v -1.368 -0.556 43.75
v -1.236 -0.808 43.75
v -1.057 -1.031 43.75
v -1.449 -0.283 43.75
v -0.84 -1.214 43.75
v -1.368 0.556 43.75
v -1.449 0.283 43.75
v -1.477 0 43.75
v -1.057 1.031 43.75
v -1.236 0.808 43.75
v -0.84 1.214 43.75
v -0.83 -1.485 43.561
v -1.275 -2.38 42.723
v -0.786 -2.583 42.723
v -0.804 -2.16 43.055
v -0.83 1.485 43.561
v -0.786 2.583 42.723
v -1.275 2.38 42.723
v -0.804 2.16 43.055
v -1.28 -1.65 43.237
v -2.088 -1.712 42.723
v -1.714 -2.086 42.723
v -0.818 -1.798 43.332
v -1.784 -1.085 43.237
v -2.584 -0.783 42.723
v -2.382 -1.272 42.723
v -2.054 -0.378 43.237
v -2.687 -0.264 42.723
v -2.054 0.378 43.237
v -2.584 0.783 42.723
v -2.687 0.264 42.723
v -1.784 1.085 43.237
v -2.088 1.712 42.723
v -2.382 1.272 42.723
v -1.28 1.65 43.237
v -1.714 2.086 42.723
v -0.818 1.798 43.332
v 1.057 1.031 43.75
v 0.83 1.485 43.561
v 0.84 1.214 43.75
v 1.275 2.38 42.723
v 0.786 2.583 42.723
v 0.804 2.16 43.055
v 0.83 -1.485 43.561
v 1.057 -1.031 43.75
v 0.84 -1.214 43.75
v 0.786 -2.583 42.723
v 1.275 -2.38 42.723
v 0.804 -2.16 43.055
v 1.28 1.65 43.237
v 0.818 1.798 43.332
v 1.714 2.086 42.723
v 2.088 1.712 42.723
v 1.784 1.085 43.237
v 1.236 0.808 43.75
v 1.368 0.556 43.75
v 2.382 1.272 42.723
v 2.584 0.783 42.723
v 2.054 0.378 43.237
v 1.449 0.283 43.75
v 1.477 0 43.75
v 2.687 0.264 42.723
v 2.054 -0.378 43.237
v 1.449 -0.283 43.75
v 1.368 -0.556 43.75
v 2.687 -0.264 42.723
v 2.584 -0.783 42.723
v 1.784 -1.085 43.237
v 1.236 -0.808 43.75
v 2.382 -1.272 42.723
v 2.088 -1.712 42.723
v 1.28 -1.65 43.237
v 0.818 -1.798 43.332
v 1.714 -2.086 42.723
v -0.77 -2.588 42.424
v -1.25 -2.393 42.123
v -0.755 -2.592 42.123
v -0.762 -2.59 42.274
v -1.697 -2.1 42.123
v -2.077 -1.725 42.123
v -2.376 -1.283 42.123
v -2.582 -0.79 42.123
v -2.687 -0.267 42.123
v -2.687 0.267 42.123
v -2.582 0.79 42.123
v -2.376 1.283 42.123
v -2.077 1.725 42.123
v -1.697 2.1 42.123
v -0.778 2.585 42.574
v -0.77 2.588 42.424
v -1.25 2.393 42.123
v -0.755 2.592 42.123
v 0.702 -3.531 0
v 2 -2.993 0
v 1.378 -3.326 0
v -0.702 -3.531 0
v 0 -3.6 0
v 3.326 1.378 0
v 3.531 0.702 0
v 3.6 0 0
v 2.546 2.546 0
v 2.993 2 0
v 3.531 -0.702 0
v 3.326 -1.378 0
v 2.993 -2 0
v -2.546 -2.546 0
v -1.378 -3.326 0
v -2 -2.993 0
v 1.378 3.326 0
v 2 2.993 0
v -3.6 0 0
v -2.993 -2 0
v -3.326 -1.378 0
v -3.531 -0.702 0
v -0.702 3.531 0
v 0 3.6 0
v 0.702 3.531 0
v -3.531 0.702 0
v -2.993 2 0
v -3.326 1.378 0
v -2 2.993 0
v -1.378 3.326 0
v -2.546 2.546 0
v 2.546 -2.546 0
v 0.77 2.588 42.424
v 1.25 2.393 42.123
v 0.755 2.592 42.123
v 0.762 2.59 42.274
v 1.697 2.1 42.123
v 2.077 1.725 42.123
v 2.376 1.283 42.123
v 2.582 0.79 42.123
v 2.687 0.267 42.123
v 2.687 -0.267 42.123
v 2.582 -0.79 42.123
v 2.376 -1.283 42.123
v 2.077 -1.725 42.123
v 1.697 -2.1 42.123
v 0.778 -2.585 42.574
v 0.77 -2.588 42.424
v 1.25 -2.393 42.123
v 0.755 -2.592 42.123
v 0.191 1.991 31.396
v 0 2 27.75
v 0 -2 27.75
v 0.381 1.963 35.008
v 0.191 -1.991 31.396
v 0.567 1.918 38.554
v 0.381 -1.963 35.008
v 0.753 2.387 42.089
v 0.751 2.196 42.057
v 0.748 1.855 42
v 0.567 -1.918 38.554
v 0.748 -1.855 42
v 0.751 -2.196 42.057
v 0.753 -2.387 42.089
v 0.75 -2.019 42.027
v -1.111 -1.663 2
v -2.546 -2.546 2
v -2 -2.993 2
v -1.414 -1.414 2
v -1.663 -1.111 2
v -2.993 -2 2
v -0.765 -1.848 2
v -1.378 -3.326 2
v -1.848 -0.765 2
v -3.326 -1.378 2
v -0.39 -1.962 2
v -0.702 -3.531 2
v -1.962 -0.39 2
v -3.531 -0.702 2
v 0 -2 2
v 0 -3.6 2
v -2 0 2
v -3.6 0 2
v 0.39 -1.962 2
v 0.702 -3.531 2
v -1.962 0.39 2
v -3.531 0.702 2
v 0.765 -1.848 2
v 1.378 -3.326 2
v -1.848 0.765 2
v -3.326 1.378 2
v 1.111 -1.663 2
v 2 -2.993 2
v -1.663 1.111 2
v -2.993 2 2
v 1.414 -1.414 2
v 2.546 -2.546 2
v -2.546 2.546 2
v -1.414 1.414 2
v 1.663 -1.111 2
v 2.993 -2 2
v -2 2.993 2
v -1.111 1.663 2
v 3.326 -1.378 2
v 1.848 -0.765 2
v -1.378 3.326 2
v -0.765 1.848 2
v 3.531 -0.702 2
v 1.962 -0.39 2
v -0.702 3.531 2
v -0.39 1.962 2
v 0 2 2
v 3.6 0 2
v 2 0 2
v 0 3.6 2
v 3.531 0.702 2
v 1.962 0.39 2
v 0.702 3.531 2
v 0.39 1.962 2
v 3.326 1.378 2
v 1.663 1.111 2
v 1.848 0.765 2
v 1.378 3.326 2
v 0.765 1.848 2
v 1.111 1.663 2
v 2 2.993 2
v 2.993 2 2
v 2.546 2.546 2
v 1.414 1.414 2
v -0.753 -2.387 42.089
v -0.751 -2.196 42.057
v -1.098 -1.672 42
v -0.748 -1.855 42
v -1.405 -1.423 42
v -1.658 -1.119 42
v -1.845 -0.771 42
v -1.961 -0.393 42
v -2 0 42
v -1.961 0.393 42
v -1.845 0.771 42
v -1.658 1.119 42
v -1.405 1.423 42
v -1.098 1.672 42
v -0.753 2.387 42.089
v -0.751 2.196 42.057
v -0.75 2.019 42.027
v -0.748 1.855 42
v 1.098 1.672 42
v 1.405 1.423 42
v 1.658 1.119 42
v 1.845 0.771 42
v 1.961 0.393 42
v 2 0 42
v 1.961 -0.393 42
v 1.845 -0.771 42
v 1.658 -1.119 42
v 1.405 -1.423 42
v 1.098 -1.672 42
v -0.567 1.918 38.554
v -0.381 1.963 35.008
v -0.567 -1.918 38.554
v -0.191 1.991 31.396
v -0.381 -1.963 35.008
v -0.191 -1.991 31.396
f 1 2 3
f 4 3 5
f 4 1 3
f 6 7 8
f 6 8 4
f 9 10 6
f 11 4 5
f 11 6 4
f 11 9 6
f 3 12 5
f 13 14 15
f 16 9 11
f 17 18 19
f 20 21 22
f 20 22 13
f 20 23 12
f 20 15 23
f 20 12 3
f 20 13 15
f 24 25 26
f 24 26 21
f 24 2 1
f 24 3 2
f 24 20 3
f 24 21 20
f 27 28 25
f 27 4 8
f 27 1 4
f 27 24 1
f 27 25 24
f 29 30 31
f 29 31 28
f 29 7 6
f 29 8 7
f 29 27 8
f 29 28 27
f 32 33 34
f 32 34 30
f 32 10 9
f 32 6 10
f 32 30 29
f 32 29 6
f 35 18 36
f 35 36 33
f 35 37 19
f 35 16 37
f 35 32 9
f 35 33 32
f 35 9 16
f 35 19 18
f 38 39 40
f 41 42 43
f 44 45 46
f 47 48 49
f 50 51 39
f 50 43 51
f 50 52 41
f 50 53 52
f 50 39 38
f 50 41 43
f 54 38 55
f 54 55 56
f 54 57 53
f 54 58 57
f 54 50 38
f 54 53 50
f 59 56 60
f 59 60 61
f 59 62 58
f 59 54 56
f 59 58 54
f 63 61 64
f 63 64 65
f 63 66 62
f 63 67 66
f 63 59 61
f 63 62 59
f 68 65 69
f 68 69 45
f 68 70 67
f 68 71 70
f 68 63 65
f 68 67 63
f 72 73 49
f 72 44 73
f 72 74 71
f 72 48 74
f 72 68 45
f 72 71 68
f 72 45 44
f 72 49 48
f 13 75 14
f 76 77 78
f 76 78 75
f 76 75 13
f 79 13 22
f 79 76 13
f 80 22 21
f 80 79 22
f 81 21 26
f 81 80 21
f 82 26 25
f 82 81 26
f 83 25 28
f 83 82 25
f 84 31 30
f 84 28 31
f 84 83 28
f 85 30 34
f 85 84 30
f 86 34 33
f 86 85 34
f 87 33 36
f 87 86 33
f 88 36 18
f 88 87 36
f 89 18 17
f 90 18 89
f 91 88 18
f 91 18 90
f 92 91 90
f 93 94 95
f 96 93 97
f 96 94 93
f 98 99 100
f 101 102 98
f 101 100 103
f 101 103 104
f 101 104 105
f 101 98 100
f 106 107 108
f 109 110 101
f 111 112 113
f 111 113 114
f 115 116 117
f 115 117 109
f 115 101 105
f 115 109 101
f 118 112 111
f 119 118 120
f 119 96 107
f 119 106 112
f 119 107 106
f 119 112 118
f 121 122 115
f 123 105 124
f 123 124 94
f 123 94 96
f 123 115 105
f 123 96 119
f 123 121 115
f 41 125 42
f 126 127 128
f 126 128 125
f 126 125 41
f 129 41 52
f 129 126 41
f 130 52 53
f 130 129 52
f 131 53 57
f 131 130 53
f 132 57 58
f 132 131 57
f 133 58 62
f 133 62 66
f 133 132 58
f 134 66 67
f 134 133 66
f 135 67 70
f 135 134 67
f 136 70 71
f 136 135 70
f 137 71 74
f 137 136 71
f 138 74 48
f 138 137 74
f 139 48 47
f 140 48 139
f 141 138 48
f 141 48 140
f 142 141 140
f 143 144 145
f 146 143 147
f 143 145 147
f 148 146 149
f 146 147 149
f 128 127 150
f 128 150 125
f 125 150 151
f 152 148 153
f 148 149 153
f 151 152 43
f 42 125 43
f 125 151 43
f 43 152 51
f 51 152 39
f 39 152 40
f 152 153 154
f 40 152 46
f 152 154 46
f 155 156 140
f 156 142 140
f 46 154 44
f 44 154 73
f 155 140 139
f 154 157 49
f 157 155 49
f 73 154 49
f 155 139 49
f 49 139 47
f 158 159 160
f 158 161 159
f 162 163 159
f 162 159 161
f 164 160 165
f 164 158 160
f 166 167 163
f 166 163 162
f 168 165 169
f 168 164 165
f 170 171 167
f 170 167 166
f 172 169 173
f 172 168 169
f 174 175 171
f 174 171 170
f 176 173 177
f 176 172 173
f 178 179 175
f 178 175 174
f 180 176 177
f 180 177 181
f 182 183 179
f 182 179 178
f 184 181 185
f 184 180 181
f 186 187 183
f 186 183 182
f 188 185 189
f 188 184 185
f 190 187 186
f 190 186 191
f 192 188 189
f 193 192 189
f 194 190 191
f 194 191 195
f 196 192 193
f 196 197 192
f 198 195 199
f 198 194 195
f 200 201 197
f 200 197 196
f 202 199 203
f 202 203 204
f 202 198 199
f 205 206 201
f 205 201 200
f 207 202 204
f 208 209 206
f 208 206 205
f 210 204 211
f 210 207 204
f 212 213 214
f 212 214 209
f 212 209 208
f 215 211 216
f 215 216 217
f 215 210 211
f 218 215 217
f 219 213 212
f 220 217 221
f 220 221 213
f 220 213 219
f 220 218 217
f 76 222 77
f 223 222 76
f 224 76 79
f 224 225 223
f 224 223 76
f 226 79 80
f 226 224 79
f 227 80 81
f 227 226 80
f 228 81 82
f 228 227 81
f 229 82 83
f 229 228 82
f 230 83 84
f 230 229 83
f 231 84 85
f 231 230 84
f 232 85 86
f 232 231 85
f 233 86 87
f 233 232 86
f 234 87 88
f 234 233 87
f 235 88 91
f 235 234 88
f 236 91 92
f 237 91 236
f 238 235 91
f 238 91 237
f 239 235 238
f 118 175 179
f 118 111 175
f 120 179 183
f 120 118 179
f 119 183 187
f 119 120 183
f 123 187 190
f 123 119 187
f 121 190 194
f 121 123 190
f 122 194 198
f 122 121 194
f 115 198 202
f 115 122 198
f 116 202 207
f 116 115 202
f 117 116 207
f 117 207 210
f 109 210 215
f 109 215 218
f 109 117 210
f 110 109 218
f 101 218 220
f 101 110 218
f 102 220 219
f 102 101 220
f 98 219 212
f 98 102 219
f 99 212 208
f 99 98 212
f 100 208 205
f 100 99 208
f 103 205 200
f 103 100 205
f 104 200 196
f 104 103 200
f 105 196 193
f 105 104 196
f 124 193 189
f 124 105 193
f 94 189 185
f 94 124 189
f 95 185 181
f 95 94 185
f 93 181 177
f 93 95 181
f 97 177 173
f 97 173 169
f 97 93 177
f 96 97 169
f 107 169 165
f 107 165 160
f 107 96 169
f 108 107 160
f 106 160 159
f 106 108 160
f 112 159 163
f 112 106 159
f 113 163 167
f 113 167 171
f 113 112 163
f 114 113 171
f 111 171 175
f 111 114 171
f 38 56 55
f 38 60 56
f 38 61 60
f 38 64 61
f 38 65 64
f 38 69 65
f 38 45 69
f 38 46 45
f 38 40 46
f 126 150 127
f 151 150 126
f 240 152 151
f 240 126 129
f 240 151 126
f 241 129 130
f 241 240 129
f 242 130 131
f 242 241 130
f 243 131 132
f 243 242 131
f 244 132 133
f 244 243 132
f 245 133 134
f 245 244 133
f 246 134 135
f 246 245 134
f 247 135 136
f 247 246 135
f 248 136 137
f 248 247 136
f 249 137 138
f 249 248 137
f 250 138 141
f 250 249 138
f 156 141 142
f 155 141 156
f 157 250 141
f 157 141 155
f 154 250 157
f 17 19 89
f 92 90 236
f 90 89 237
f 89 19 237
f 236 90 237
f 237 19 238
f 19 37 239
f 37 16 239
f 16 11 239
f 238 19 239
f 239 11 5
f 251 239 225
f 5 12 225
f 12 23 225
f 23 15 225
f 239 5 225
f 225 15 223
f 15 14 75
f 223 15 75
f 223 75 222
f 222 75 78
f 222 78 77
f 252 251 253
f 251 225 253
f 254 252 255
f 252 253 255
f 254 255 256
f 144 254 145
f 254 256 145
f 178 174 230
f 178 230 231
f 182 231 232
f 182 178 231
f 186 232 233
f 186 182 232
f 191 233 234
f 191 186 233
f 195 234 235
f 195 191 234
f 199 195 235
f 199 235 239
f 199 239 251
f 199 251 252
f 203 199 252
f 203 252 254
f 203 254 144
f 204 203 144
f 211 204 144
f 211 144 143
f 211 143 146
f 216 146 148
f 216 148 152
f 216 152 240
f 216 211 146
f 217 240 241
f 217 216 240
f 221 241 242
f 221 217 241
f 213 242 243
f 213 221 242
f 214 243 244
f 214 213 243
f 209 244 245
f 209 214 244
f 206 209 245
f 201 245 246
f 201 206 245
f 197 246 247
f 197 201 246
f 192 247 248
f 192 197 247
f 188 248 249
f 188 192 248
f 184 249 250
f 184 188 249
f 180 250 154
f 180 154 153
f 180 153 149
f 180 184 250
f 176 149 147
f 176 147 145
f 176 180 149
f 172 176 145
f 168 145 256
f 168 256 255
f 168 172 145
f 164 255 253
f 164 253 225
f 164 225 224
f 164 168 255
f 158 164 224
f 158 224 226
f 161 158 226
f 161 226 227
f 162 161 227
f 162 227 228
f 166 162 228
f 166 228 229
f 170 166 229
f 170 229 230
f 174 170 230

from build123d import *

# Parameters (mm, degrees)
F3_DEPTH      = 4
F3_DEPTH_BACK = 4


with BuildPart() as f2:
    # F0 (on Front) → F2 (revolve)
    with BuildSketch(Plane.XZ):
        Polygon((0, 43.75), (-1.47658, 43.75), (-2.7, 42.723429), (-2.7, 42.123429), (-2, 42), (-2, 2), (-3.6, 2), (-3.6, 0), (0, 0), align=None)
    revolve(axis=Axis((0, 0, -1.246396), (0, 0, -1)))


with BuildPart() as f3:
    # F1 (on Front) → F3 (new body, two sides)
    with BuildSketch(Plane.XZ) as f3_sk:
        Polygon((0.84, 43.75), (-0.84, 43.75), (0, 27.75), align=None)
    extrude(amount=F3_DEPTH)
    extrude(f3_sk.sketch, amount=-F3_DEPTH_BACK)


with BuildPart() as f2_1:
    add(f2.part)

    # F4: cut F3
    add(f3.part, mode=Mode.SUBTRACT)


solid = f2_1.part
